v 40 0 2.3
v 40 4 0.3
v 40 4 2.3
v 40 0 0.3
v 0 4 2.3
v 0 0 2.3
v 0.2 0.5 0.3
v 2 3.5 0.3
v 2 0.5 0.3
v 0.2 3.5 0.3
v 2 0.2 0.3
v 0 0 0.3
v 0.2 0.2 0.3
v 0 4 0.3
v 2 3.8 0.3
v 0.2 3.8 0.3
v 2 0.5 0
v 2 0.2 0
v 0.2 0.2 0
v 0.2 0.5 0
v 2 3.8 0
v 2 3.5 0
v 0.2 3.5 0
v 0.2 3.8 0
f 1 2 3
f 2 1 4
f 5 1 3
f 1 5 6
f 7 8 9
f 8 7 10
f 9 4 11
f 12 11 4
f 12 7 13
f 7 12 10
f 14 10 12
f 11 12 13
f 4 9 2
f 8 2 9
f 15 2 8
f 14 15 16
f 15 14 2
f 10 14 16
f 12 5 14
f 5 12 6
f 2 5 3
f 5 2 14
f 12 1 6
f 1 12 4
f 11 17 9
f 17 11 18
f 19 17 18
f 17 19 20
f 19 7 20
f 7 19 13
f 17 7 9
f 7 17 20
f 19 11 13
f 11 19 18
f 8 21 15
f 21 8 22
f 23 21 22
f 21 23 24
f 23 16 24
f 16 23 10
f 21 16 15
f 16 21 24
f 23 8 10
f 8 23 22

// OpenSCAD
// 40 x 4 x 2 slab on two 0.3 mm posts under ONE end (x 0-2): a cantilever, not a 4 mm bridge.
translate([0, 0, 0.3]) cube([40, 4, 2]);
translate([0.2, 0.2, 0]) cube([1.8, 0.3, 0.4]);
translate([0.2, 3.5, 0]) cube([1.8, 0.3, 0.4]);
